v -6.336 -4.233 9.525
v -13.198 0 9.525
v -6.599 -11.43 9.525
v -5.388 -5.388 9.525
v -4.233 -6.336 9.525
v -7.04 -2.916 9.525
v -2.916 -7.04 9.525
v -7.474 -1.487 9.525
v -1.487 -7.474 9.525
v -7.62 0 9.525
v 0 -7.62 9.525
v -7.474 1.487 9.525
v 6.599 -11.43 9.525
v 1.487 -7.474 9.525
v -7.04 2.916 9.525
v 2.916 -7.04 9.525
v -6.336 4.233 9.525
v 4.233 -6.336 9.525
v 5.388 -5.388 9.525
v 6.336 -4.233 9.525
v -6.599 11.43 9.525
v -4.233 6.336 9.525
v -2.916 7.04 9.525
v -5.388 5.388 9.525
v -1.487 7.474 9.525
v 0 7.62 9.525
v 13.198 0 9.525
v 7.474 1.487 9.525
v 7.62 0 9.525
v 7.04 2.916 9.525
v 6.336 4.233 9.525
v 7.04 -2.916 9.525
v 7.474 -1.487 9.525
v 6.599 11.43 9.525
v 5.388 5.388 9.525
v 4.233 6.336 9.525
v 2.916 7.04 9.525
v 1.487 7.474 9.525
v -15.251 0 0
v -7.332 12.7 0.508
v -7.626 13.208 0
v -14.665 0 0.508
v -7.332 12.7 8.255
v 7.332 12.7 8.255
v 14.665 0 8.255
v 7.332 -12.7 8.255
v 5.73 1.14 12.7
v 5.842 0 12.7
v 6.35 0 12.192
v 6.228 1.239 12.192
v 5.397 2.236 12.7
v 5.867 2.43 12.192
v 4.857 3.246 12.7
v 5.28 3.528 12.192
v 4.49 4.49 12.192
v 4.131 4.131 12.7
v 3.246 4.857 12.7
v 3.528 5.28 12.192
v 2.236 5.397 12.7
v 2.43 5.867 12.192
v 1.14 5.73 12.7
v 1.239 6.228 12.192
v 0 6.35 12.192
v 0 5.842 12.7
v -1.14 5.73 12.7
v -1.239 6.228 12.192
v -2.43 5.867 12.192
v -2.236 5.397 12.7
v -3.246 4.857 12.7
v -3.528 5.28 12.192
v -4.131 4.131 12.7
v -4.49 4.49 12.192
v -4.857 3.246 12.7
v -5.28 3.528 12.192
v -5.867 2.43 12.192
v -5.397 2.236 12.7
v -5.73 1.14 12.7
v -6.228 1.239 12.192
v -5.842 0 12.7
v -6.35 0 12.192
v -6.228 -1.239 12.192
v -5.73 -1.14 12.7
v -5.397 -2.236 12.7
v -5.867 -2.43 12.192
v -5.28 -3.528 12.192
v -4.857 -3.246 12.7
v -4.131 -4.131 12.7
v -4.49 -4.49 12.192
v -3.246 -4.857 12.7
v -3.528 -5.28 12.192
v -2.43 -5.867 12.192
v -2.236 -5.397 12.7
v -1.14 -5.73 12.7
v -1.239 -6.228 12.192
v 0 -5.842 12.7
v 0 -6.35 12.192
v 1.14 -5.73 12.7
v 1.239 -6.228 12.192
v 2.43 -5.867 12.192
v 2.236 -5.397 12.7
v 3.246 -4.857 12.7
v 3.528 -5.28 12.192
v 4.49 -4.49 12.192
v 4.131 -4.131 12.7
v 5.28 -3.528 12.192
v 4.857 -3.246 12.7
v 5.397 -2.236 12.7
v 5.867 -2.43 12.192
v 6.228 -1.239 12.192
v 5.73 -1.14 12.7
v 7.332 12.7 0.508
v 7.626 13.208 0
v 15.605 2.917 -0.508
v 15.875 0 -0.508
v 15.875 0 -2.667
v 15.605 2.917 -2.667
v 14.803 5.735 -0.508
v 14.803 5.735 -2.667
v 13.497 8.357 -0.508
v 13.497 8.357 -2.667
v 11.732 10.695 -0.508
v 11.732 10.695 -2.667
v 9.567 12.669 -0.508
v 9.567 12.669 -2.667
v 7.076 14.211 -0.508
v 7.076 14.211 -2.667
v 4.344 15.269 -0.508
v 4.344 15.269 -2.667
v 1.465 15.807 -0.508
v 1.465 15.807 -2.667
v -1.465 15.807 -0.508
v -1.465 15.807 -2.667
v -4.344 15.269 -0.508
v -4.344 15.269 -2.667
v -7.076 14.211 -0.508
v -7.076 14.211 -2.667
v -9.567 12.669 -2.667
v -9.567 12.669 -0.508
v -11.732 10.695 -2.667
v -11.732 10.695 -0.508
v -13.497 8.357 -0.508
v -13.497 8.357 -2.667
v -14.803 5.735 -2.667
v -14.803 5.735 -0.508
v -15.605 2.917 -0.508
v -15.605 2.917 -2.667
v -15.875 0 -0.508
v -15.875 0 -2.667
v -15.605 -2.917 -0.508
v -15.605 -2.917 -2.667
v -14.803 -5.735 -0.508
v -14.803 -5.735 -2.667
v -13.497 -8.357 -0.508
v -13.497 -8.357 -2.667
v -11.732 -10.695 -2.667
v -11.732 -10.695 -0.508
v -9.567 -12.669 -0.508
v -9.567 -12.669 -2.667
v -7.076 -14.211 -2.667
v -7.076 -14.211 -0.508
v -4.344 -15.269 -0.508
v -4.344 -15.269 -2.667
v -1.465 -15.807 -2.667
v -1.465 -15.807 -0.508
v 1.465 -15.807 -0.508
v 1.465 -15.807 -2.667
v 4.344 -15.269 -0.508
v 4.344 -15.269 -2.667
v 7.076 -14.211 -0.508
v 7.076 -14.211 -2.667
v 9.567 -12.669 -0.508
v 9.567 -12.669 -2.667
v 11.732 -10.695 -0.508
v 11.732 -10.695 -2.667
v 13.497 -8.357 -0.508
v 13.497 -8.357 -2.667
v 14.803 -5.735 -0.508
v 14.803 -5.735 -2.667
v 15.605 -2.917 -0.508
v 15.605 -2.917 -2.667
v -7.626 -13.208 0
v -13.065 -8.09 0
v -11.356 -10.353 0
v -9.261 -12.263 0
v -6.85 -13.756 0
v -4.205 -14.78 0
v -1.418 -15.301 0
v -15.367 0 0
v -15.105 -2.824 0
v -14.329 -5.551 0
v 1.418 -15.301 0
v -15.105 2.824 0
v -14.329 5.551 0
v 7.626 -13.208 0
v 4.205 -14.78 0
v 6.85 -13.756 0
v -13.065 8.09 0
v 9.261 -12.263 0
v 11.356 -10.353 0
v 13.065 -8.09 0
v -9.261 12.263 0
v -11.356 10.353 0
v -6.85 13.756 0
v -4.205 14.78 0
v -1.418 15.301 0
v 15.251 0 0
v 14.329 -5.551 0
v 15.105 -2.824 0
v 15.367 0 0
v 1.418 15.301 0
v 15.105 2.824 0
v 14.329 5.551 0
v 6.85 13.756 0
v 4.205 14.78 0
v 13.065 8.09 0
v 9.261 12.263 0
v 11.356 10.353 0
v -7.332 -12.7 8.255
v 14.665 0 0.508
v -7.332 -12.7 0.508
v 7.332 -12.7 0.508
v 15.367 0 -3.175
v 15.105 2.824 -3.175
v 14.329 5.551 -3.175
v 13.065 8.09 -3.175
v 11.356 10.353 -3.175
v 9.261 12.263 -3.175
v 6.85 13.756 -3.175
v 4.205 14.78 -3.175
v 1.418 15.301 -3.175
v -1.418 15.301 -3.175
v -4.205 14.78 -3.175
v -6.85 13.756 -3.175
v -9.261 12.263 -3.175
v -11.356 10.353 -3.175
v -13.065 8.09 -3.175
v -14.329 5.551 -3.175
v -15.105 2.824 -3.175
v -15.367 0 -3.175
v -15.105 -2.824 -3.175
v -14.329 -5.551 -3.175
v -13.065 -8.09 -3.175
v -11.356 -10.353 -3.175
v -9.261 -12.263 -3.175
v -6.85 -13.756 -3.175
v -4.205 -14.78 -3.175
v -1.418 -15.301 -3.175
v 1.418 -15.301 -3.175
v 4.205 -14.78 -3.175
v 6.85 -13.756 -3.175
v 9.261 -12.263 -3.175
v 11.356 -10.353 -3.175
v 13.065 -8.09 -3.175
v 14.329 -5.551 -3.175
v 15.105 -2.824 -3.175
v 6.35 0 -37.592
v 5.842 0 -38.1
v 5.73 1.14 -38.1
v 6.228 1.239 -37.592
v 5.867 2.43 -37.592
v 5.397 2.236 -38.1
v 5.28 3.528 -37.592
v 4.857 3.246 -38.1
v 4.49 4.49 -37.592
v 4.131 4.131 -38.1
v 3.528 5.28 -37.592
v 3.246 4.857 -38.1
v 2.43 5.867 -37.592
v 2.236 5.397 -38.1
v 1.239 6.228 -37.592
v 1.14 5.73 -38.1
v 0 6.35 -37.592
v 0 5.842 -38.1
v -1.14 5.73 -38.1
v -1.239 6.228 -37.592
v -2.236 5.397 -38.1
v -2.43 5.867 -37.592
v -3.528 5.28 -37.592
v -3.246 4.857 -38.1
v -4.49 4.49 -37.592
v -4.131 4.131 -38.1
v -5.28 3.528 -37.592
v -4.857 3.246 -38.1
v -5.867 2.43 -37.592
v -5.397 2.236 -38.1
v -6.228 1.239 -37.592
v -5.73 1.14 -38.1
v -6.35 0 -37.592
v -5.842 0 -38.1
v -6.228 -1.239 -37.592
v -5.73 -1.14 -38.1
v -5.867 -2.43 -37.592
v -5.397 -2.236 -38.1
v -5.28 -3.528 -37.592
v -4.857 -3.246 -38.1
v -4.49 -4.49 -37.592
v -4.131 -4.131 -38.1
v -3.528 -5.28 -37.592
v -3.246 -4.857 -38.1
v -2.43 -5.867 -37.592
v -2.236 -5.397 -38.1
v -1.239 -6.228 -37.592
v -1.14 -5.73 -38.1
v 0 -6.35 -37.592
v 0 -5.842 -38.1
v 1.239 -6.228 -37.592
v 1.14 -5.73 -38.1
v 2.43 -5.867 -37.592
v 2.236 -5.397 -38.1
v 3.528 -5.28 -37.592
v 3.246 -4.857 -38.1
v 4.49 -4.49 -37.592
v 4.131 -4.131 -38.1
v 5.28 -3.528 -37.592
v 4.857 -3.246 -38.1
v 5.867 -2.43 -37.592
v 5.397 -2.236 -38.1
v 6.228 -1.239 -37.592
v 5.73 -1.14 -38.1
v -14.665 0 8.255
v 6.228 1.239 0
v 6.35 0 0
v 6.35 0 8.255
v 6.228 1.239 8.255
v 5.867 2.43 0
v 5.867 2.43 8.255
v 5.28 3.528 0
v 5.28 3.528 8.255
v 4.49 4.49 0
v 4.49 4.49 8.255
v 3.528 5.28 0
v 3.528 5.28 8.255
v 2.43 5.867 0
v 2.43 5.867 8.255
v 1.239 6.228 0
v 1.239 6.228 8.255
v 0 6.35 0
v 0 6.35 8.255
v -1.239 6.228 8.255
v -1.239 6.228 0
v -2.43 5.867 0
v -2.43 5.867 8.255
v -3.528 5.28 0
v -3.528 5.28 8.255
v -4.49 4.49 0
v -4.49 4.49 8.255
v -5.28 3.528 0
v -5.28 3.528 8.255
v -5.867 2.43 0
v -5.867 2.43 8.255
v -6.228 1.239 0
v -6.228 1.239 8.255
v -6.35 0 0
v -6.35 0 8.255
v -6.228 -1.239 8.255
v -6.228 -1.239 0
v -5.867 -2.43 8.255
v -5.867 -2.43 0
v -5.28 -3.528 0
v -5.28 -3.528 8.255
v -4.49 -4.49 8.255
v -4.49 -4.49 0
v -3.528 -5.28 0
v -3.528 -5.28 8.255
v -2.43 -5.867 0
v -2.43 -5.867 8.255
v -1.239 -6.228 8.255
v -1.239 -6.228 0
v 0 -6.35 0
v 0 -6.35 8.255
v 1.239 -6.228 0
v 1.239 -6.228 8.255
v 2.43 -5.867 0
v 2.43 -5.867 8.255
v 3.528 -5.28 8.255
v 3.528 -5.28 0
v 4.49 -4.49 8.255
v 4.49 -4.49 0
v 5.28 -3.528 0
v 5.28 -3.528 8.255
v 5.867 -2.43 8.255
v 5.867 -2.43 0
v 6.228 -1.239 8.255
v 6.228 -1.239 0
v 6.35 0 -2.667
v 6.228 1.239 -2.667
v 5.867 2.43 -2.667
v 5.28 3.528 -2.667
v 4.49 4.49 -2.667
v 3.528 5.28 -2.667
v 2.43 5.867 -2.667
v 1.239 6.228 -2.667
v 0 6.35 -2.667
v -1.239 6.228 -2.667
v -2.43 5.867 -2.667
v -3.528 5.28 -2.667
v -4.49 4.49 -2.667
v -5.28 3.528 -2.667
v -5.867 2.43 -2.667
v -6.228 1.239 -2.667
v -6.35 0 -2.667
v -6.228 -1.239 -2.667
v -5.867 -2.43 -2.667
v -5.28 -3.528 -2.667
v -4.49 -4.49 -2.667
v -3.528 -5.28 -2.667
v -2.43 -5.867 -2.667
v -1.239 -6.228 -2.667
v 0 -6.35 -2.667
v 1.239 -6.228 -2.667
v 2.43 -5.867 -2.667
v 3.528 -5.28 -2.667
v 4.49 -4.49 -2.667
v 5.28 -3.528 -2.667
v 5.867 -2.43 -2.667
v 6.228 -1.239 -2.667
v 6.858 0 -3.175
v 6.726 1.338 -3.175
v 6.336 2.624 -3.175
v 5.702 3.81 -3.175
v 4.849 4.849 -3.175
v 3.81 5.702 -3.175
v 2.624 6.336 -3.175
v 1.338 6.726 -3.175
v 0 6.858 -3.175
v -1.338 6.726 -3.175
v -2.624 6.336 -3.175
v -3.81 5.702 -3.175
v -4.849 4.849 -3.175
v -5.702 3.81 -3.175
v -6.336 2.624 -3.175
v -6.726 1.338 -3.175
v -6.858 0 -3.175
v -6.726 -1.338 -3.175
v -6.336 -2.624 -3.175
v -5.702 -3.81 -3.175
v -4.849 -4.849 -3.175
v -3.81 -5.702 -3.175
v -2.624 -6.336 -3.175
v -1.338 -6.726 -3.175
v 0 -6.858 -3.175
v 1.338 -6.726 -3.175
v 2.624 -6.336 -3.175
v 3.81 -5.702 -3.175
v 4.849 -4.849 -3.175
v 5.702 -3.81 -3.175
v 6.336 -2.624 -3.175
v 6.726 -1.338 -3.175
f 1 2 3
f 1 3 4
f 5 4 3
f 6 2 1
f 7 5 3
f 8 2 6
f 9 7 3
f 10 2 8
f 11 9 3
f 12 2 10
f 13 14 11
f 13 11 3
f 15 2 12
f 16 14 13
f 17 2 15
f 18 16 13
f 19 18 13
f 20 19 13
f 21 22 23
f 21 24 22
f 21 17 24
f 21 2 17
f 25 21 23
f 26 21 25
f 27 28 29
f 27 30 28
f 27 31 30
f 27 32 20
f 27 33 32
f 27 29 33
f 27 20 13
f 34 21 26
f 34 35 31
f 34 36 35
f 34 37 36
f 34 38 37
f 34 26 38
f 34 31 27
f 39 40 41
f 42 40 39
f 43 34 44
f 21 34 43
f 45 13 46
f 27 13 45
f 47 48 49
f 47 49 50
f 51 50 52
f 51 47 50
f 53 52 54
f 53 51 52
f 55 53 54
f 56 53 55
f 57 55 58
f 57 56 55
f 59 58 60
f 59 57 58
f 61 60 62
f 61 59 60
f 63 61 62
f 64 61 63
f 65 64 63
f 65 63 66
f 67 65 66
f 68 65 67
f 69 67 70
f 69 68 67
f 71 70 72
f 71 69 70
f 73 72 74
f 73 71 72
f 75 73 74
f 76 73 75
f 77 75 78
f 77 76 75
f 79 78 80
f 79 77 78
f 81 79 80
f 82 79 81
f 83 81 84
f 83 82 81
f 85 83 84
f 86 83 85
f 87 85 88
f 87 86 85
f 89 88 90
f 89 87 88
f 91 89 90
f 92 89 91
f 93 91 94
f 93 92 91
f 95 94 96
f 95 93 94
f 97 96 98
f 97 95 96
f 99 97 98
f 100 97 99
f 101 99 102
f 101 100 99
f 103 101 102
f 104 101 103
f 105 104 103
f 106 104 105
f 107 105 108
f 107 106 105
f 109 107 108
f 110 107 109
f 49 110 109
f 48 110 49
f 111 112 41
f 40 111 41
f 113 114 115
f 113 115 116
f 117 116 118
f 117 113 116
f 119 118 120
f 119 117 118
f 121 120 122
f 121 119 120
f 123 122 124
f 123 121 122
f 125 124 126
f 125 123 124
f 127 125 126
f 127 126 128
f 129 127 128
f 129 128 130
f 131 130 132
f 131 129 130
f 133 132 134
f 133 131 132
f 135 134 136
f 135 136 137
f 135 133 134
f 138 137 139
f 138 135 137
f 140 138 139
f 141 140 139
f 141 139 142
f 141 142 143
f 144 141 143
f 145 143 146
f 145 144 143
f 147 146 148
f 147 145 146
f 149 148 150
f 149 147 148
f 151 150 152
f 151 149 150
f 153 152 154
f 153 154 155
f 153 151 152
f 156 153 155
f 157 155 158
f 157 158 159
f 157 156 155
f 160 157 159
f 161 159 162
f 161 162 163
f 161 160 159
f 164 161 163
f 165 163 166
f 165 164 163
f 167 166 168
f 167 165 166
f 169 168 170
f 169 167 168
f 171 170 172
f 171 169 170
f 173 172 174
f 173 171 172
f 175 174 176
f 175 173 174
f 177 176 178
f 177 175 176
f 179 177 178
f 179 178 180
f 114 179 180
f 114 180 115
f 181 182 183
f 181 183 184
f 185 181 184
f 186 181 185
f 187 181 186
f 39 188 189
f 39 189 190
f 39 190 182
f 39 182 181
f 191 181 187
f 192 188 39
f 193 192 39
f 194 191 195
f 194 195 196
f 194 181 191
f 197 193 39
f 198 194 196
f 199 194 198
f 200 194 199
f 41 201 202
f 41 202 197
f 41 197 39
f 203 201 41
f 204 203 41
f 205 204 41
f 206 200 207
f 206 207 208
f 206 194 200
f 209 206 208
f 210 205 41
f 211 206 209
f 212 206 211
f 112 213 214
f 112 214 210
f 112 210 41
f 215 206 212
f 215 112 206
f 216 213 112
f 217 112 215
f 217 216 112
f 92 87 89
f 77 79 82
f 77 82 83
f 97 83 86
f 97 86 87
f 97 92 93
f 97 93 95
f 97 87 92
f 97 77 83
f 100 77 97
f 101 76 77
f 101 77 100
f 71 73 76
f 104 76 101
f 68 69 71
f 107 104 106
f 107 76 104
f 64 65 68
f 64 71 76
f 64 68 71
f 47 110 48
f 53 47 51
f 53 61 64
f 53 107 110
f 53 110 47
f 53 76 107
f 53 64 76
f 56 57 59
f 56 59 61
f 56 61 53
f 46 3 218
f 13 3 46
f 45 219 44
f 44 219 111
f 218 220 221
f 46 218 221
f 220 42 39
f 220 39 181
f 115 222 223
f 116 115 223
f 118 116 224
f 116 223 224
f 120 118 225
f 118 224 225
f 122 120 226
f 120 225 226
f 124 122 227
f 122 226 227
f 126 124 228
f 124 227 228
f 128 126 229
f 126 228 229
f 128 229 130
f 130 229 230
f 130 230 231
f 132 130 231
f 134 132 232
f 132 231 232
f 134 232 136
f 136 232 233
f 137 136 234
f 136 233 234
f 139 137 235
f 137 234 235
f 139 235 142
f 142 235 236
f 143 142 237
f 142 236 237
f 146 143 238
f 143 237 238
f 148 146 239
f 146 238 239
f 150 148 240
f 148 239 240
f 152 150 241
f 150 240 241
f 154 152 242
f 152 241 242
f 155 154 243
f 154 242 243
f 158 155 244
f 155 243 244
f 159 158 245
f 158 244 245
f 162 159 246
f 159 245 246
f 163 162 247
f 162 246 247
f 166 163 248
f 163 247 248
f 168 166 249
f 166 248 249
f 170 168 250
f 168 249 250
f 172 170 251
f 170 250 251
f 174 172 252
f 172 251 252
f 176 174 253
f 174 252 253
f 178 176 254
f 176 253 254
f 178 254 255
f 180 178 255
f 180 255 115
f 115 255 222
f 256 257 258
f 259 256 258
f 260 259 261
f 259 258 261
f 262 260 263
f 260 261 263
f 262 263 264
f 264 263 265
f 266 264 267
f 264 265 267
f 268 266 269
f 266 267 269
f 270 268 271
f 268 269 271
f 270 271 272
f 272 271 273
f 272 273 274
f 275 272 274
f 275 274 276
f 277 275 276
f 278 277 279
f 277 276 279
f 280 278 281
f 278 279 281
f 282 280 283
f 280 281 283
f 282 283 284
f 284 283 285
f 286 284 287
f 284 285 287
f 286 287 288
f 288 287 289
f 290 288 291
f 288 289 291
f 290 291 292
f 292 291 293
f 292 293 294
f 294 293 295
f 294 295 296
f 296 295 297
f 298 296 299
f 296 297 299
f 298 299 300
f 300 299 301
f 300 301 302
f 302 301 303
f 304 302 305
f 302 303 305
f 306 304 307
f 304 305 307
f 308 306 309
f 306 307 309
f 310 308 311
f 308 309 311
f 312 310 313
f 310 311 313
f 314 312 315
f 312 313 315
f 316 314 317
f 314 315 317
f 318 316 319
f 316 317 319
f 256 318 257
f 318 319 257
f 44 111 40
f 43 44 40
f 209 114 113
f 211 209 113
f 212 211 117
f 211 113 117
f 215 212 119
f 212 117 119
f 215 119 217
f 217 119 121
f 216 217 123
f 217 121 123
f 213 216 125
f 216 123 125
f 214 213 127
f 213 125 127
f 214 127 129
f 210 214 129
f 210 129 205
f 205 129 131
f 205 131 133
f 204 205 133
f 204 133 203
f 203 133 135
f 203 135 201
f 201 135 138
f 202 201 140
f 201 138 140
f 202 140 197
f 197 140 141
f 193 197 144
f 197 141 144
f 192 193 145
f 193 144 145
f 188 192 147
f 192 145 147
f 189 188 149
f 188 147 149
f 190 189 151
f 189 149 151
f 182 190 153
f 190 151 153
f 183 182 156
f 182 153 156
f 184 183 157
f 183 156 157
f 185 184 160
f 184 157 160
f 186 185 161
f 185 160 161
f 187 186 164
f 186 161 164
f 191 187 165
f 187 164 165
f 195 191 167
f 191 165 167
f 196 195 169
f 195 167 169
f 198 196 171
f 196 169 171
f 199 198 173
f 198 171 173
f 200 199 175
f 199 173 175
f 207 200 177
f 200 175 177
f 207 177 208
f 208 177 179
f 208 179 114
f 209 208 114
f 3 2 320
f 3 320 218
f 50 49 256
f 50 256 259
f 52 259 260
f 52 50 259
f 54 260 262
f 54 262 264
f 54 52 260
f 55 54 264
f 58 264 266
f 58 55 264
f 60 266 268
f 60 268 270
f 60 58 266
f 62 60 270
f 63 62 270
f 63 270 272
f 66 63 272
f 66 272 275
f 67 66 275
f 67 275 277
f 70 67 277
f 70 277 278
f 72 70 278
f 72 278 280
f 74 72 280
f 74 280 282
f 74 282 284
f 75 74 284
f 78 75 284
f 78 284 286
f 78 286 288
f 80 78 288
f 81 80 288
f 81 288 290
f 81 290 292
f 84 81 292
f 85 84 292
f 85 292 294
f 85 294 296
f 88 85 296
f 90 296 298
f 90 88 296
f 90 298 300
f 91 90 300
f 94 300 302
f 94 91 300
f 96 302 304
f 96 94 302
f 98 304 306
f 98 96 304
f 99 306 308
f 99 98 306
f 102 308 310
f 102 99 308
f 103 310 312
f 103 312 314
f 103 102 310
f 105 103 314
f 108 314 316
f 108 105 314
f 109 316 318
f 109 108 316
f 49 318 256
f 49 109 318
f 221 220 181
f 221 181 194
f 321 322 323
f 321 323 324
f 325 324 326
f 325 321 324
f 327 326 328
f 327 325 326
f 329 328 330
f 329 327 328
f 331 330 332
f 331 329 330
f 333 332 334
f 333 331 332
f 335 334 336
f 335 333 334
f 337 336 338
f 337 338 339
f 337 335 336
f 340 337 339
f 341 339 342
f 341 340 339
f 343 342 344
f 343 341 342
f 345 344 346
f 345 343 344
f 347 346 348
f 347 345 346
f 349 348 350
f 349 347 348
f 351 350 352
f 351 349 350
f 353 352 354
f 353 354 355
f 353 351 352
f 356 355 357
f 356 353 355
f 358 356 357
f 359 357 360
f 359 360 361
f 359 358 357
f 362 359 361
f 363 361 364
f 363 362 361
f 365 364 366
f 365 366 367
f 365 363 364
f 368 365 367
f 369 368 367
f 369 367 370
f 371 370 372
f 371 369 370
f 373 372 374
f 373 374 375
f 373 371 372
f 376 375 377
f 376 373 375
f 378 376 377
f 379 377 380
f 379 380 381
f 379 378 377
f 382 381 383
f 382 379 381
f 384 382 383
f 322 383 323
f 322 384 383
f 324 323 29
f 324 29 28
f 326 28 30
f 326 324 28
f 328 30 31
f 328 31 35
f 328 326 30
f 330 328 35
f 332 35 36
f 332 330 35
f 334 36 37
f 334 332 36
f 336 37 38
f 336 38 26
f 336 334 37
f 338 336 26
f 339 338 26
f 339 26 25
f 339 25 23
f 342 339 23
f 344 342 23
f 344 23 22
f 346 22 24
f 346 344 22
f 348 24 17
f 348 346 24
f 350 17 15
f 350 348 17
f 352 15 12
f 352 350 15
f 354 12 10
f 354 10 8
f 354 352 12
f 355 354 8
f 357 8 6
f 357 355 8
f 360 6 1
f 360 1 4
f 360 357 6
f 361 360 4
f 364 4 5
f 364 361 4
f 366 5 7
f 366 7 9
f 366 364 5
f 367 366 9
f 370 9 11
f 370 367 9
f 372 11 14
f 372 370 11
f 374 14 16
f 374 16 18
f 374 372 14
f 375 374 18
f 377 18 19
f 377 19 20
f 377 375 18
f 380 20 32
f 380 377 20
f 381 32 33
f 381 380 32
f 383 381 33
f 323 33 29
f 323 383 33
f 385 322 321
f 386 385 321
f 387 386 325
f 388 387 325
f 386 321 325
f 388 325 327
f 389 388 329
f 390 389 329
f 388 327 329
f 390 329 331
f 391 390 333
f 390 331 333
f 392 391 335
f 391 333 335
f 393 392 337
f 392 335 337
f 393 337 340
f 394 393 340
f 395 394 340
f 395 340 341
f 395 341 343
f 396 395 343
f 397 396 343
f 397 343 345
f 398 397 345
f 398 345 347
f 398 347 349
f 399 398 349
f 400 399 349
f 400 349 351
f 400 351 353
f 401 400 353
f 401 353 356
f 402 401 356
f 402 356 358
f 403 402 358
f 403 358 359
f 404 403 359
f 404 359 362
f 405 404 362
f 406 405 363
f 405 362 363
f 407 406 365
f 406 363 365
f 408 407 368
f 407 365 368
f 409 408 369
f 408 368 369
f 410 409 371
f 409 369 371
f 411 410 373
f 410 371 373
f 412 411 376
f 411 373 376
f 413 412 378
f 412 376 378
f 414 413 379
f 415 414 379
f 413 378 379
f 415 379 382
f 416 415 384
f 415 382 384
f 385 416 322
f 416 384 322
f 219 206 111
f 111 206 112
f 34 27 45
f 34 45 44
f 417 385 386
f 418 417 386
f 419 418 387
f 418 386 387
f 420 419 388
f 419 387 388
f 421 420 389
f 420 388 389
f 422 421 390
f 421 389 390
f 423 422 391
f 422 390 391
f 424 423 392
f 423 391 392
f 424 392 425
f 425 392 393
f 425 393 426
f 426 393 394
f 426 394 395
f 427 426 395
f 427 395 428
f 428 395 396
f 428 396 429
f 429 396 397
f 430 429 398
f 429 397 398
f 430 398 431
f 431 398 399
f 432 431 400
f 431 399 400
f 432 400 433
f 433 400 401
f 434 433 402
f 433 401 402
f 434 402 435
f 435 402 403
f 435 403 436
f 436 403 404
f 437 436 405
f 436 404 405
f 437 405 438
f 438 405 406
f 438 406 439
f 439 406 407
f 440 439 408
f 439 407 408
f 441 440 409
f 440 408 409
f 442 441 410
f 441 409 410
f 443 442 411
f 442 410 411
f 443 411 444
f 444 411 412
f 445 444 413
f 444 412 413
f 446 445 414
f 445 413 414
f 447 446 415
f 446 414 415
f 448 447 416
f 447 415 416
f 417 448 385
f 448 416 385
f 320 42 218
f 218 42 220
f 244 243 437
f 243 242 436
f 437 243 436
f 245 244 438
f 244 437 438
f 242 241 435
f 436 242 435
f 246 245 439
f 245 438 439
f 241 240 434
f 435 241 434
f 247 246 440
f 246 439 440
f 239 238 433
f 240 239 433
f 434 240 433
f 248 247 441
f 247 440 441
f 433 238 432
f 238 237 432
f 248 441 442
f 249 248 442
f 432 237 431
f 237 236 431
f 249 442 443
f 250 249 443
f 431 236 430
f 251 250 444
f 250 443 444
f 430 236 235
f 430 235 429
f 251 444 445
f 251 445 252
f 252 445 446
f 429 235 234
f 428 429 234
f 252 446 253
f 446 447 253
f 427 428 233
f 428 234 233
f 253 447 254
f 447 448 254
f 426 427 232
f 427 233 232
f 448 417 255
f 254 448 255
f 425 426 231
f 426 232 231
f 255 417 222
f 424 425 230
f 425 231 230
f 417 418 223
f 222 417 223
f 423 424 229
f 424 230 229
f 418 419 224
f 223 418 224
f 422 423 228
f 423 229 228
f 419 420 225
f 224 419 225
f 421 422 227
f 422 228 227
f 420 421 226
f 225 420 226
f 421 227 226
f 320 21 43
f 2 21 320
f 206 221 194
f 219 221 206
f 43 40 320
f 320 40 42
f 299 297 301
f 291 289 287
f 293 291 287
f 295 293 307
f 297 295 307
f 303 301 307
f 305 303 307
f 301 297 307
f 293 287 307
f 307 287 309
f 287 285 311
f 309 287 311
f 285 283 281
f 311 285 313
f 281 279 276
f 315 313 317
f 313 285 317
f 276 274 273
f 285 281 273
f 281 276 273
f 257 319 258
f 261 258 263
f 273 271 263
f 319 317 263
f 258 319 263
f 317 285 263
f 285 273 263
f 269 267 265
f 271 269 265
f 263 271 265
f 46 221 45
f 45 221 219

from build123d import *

# Parameters (mm, degrees)
F0_R          = 15.875
F0_R_2        = 6.35
F1_DEPTH      = 3.175
F2_DEPTH      = 9.525
F3_SIZE       = 1.27
F4_DEPTH      = 25.4
F5_SIZE       = 0.508
F6_DEPTH      = 12.7
F6_DEPTH_BACK = 38.1
F7_SIZE       = 0.508


with BuildPart() as f1:
    # F0 (on Top) → F1 (new body)
    with BuildSketch(Plane.XY):
        Circle(F0_R)
        Polygon((-14.6646968374, 0), (-7.3323484187, 12.7), (7.3323484187, 12.7), (14.6646968374, 0), (7.3323484187, -12.7), (-7.3323484187, -12.7), align=None, mode=Mode.SUBTRACT)
        Polygon((7.3323484187, 12.7), (-7.3323484187, 12.7), (-14.6646968374, 0), (-7.3323484187, -12.7), (7.3323484187, -12.7), (14.6646968374, 0), align=None)
        Circle(F0_R_2, mode=Mode.SUBTRACT)
        Circle(F0_R_2)
    extrude(amount=-F1_DEPTH)

    # F0 (on Top) → F2 (join)
    with BuildSketch(Plane.XY):
        Polygon((7.3323484187, 12.7), (-7.3323484187, 12.7), (-14.6646968374, 0), (-7.3323484187, -12.7), (7.3323484187, -12.7), (14.6646968374, 0), align=None)
        Circle(F0_R_2, mode=Mode.SUBTRACT)
    extrude(amount=F2_DEPTH)

    # F3
    f3_edges = [f1.edges().sort_by_distance(p)[0] for p in [
        (0, 12.7, 9.525),
        (-10.998523, 6.35, 9.525),
        (-10.998523, -6.35, 9.525),
        (0, -12.7, 9.525),
        (10.998523, -6.35, 9.525),
        (10.998523, 6.35, 9.525),
        (-6.35, 0, 9.525),
    ]]
    chamfer(f3_edges, length=F3_SIZE)

    # F0 (on Top) → F4 (cut)
    with BuildSketch(Plane.XY):
        Circle(F0_R_2)
    extrude(amount=-F4_DEPTH, mode=Mode.SUBTRACT)

    # F5
    f5_edges = [f1.edges().sort_by_distance(p)[0] for p in [
        (-15.875, 0, -3.175),
        (-6.35, 0, -3.175),
        (-15.875, 0, 0),
        (0, 12.7, 0),
        (-10.998523, 6.35, 0),
        (-10.998523, -6.35, 0),
        (0, -12.7, 0),
        (10.998523, -6.35, 0),
        (10.998523, 6.35, 0),
    ]]
    chamfer(f5_edges, length=F5_SIZE)


with BuildPart() as f6:
    # F0 (on Top) → F6 (new body, two sides)
    with BuildSketch(Plane.XY) as f6_sk:
        Circle(F0_R_2)
    extrude(amount=F6_DEPTH)
    extrude(f6_sk.sketch, amount=-F6_DEPTH_BACK)

    # F7
    f7_edges = [f6.edges().sort_by_distance(p)[0] for p in [
        (-6.35, 0, 12.7),
        (-6.35, 0, -38.1),
    ]]
    chamfer(f7_edges, length=F7_SIZE)


solid = Compound([f1.part, f6.part])
